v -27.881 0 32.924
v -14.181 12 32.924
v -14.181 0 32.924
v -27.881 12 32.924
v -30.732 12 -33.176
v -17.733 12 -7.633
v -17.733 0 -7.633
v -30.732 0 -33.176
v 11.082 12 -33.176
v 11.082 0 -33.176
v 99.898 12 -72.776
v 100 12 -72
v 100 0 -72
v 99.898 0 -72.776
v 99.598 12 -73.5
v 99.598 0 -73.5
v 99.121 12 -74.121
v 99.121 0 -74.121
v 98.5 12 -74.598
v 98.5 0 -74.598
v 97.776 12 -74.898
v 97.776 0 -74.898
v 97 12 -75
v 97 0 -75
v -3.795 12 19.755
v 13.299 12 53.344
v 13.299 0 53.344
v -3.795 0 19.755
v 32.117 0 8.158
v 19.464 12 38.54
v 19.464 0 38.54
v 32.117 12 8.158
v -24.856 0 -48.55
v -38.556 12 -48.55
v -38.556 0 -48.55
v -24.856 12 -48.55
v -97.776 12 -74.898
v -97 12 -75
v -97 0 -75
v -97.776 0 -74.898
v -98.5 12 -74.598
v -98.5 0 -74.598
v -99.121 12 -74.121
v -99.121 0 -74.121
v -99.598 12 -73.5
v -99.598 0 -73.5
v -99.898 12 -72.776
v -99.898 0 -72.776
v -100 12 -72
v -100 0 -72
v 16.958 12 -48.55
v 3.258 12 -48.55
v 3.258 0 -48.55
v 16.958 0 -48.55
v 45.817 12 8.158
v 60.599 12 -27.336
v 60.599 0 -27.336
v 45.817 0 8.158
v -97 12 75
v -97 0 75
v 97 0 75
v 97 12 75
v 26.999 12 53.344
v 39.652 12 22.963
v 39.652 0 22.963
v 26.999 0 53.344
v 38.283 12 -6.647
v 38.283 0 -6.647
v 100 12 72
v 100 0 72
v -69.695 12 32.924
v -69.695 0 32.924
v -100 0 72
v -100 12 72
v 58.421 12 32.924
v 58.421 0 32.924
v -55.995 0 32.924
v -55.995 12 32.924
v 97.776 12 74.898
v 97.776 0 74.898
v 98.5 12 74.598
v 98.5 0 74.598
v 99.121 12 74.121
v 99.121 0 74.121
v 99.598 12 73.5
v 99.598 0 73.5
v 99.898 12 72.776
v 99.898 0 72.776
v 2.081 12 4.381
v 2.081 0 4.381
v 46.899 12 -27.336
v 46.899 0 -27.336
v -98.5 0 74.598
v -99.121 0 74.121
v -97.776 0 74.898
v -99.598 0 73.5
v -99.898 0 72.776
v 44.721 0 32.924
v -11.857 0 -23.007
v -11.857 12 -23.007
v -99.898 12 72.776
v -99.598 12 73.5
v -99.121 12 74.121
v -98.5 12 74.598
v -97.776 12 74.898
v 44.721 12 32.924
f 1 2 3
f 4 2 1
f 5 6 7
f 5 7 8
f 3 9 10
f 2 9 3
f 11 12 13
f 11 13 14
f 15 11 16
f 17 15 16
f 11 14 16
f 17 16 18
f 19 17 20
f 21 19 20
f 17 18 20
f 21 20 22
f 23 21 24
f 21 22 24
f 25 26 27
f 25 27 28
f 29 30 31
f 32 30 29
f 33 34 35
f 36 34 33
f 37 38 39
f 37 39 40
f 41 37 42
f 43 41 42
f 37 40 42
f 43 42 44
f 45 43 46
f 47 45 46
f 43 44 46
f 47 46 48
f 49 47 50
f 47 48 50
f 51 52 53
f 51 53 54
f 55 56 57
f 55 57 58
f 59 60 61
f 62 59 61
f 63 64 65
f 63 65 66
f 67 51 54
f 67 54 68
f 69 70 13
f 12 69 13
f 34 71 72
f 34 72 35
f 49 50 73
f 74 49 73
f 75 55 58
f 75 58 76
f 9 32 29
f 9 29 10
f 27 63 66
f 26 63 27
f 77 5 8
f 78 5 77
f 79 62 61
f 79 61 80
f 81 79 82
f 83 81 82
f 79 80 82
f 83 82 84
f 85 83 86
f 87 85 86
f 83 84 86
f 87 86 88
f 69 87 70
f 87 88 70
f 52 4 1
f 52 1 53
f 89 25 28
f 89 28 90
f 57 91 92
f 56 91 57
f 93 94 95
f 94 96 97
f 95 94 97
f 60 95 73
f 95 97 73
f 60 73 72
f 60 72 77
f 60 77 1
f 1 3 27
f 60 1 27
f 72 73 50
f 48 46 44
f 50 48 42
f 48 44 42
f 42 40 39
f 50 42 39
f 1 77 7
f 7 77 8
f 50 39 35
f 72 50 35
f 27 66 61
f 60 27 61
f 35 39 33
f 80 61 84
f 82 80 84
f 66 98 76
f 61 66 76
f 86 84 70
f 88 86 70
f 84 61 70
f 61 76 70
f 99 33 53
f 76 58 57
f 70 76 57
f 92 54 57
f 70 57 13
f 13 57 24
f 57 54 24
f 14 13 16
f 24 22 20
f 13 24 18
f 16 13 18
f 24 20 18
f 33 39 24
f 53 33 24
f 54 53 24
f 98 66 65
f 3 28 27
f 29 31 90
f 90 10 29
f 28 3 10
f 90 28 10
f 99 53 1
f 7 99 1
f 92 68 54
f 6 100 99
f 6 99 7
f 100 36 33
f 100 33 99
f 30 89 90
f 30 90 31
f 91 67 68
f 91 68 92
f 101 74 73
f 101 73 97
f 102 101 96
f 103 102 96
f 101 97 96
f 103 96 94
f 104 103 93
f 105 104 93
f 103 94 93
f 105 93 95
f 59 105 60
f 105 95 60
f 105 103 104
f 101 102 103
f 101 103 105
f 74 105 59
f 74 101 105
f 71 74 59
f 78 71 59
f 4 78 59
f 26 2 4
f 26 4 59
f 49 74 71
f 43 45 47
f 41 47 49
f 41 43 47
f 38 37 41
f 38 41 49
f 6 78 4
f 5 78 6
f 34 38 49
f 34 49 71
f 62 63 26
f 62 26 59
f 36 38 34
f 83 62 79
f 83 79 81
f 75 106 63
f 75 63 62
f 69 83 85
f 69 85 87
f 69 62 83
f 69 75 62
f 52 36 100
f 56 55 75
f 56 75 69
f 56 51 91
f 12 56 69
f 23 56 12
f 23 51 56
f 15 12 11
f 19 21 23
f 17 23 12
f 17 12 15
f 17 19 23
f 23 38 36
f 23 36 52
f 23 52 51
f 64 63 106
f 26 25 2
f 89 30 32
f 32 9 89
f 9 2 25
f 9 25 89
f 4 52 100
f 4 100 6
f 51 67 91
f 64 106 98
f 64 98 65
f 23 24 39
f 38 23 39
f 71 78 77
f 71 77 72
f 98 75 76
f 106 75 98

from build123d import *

# Parameters (mm, degrees)
BOSS_EXTRUDE1_DEPTH = 12
CUT_EXTRUDE1_DEPTH  = 12


with BuildPart() as part:
    # Sketch1 → Boss-Extrude1 (new body)
    with BuildSketch(Plane(origin=(0, 0, 0), x_dir=(1, 0, 0), z_dir=(0, 1, 0))):
        with BuildLine():
            Line((-97, -75), (97, -75))
            ThreePointArc((97, -75), (99.121320344, -74.121320344), (100, -72))
            Line((100, -72), (100, 72))
            ThreePointArc((100, 72), (99.121320344, 74.121320344), (97, 75))
            Line((97, 75), (-97, 75))
            ThreePointArc((-97, 75), (-99.121320344, 74.121320344), (-100, 72))
            Line((-100, 72), (-100, -72))
            ThreePointArc((-100, -72), (-99.121320344, -74.121320344), (-97, -75))
        make_face()
    extrude(amount=BOSS_EXTRUDE1_DEPTH)

    # Sketch2 → Cut-Extrude1 (cut)
    with BuildSketch(Plane(origin=(0, 12, 0), x_dir=(1, 0, 0), z_dir=(0, 1, 0))):
        Polygon((-24.855906811, 48.549939904), (-11.856976443, 23.007043942), (-17.732961605, 7.632856116), (-30.731891973, 33.175752078), (-55.995225818, -32.924353512), (-69.695225818, -32.924353512), (-38.555906811, 48.549939904), align=None)
        Polygon((45.817241453, -8.158042149), (58.420963339, -32.924353512), (44.720963339, -32.924353512), (39.651548235, -22.962953695), (26.998770847, -53.344492874), (13.298770847, -53.344492874), (-3.795083958, -19.755071091), (2.080901204, -4.380883265), (19.464464064, -38.539581328), (32.117241453, -8.158042149), (11.082229848, 33.175752078), (-14.181103997, -32.924353512), (-27.881103997, -32.924353512), (3.25821501, 48.549939904), (16.95821501, 48.549939904), (38.28293467, 6.646869398), (46.899276911, 27.336219357), (60.599276911, 27.336219357), align=None)
    extrude(amount=-CUT_EXTRUDE1_DEPTH, mode=Mode.SUBTRACT)


solid = part.part
